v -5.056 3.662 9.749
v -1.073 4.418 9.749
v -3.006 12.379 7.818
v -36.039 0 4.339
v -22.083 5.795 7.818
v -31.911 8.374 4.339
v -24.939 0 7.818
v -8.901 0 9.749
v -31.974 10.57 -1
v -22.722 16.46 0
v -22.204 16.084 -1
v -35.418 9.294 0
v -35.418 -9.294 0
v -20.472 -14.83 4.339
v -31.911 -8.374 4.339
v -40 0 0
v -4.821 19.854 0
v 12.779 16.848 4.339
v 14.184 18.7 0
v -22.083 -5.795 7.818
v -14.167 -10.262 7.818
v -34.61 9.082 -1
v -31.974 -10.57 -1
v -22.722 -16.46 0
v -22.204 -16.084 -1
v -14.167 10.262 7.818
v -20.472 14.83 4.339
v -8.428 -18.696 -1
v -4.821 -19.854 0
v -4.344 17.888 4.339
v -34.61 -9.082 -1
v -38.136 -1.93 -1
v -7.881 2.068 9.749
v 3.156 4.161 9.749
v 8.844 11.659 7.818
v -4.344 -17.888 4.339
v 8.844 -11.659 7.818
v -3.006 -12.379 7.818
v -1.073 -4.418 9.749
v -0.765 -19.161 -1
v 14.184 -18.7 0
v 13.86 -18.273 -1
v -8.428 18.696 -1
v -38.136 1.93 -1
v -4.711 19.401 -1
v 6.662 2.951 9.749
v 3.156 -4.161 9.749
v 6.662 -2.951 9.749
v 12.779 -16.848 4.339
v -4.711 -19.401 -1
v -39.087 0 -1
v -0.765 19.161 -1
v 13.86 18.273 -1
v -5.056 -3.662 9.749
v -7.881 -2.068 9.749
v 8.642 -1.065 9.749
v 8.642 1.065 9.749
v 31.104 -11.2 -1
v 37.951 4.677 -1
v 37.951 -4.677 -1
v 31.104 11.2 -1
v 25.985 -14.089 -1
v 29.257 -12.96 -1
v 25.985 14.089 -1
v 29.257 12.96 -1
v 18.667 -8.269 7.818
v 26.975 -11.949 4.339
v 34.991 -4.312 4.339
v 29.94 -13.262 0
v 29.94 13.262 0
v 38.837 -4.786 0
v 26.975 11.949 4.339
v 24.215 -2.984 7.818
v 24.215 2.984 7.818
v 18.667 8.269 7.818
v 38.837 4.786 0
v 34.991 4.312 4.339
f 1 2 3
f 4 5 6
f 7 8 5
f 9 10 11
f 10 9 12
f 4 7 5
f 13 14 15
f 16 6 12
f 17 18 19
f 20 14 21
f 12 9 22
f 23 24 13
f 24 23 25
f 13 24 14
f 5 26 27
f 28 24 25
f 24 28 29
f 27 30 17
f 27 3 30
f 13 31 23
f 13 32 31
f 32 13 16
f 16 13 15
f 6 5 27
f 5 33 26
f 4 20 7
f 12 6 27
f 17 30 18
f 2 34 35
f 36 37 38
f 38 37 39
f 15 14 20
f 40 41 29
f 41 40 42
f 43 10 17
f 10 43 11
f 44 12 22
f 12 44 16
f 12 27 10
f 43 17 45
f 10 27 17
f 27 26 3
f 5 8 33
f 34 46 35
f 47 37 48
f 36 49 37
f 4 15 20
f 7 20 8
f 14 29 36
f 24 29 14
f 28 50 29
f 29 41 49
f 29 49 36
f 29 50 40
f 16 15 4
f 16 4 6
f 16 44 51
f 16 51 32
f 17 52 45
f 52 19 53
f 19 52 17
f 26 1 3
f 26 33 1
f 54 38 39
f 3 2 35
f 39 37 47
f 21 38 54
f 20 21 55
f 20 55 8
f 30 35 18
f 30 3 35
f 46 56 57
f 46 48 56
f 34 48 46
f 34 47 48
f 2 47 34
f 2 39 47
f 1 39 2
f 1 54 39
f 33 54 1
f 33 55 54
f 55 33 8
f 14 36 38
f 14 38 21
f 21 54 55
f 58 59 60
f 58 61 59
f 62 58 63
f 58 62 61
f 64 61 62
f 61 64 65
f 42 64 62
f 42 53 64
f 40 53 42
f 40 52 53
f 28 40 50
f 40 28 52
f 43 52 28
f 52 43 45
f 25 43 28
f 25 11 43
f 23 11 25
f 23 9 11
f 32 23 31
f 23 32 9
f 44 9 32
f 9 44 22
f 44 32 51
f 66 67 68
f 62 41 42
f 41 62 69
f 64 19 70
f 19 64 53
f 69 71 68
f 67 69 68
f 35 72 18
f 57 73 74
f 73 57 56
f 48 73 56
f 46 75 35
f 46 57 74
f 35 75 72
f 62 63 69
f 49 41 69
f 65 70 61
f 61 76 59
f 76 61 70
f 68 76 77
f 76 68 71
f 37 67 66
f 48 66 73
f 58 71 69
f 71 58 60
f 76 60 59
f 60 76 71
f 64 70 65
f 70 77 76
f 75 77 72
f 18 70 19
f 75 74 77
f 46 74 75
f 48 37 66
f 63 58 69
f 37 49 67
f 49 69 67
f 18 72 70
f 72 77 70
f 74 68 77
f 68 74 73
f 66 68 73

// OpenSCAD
// file: icp.scad
use <../lib/util.scad>;

module icp_saucer_large(extend=false) {
    difference() {
        util_saucer(80,40,10);

        if (extend == false) {
            translate([-50,0,0])
                rotate([0,15,0])
                    cube(80,center=true);
        }

        util_mirrored([0,1,0])
            translate([-40,55,-1])
                rotate([-30,0,0])
                    cube(80,center=true);
            
        translate([40,0,0])
            rotate([0,30,0])
                cube(10,center=true);

        translate([35,0,6.4])
            rotate([0,-65,0])
                cube([5,5,7.5],center=true);

    }
}

module icp_saucer_large_2(faces=32) {
    difference() {
        util_ovoid(40,40,40,10,10,faces=faces);
        
        translate([0,0,-50])
        cube(100,center=true);

        translate([-50,0,0])
            rotate([0,15,0])
                cube(80,center=true);

        util_mirrored([0,1,0])
            translate([-40,55,-1])
                rotate([-30,0,0])
                    cube(80,center=true);
            
        translate([40,0,0])
            rotate([0,30,0])
                cube(10,center=true);

        translate([35,0,6.4])
            rotate([0,-65,0])
                cube([5,5,7.5],center=true);

    }
}

module tactical_shuttle() {
    difference() {
        util_saucer(9,9,2.25);

        translate([3,0,2])
            rotate([0,-66,0])
                cube([1.5,1.5,3],center=true);
    }

    translate([-3.5,0,1])
        scale([1,1,.5])
            rotate([90,0,0])
                cylinder(5,2,2,$fn=6,center=true);

    util_mirrored([0,1,0])
        translate([-4,1.5,1])
            rotate([90,0,0])
                util_nacelle(7.5,1,4,curved=true,up=false);
};


module runabout_old() {
    difference() {
        util_saucer(18,15,3);

        translate([6,0,3.3])
            rotate([0,-72,0])
                cube([3,3,5],center=true);
    }

    translate([-7.5,0,0])
        scale([1,1,.4])
            rotate([90,0,0])
                cylinder(9,4,4,$fn=6,center=true);

    translate([-7.5,0,1])
        mirror([0,0,1])
            util_nacelle_bar(15,2.5,2.5,.5);

    util_mirrored([0,1,0])
        translate([-3,6.5,-2])
            scale([1,1,.5])
                union() {
                    rotate([0,90,0])
                        cylinder(14,1.5,1.5,center=true,$fn=16);

                    util_mirrored([1,0,0])
                        translate([7,0,0])
                            sphere(1.5,$fn=16);
                }
}

module yacht() {
    difference() {
        util_saucer(27,27,3.5);

        translate([10,0,3])
            rotate([0,-75,0])
                cube([3,3,5],center=true);
    }

    translate([-13,0,0]) {

        difference(){
            mirror([0,0,1])
                util_saucer(16,8,2.5);

            translate([-4,0,-2.5])
                scale([1.5,1,1])
                    rotate([90,0,0])
                        cylinder(10,2.5,2.5,center=true,$fn=16);
            
            translate([-9,0,-5])
                cube(10,center=true);
            
            translate([7.5,0,-1.25])
                rotate([0,90,0])
                    cylinder(4,.5,1,$fn=16, center=true);
        }

        util_saucer(16,8,1.5);
    }

    translate([-11,0,0])
        difference() {
            util_nacelle_bar(25,2.5,27,.25);
            
            translate([-29.5,0,0])
                cylinder(40,20,20,center=true);

            util_mirrored([0,1,0])
                translate([11,25,0])
                    cylinder(40,25,25,center=true);
        }

    util_mirrored([0,1,0])
        translate([-14,11,2.5])
            util_nacelle(20,4,2,curved=true);
}


module science_runabout() {
    difference() {
        util_saucer(36,36,4);

        translate([15,0,3])
            rotate([0,-75,0])
                cube([3,3,5],center=true);
    }

    translate([-13,0,0]) difference() {
        scale([1.5,1,1.2])
            rotate([90,0,0])
                cylinder(15,4,4,$fn=6,center=true);
        
        translate([0,0,-10]) cube(20,center=true);
    }
    
    translate([-15,0,1])
        util_nacelle_bar(28,2.5,3,.5);
    
    util_mirrored([0,1,0])
        translate([-8,12,3])
            util_nacelle(24,4,2,curved=true);
}


module attack() {
    difference() {
        util_saucer(45,45,5);

        translate([20,0,3])
            rotate([0,-70,0])
                cube([3,3,5],center=true);
        
    }

    difference() {
        scale([1,1,2.5])
            util_body(45,45,1.5,6);
    
        translate([22.5,0,-1.2])
            sphere(1,$fn=16);
    }

    util_mirrored([0,1,0])
        translate([-12,12,-2.5])
            rotate([75,0,0])
                util_nacelle(40,5,12,curved=true,up=false);

    difference() {
        translate([-10,0,0])
            mirror([0,0,1])
                util_nacelle_bar(35,3.2,20,2);

        util_mirrored([0,1,0])
            translate([2,18,0])
                cylinder(15,15,15,center=true);
        
        translate([-38,0,0]) cylinder(15,22.5,22.5,center=true);
    }
}

module scout_old() {
    difference() {
        util_saucer(54,54,5);

        translate([24,0,3])
            rotate([0,-70,0])
                cube([3,3,5],center=true);
    }

    translate([-36,0,0]) 
    scale([1.33,.66,1]) {
        difference() {
            cylinder(8,8,32,center=true,$fn=4);
            translate([-35,0,0])
                cube(60,center=true);
        }

        difference() {
            cylinder(8,54,32,center=true,$fn=4);
            translate([-35,0,0])
                cube([60,200,60],center=true);
            translate([35,0,0])
                cube([60,200,60],center=true);
            translate([0,0,-60])
                cube(120,center=true);
        }
    }

    util_mirrored([0,1,0])
        translate([-24,24,1.5])
            rotate([-110,0,0])
                util_nacelle(45,4,8,curved=true);

    translate([0,0,.1])
    util_nacelle(42,32,6.7,curved=true);
}

module icp_large_saucer_common() {
    difference() {
        util_ovoid(45,45,90,5,2);
        translate([45,0,0])
        cube(16,center=true);
    }

    translate([-55,0,0]) {

        difference() {
            util_ovoid(75,25,20,8,10);
            translate([20,0,-10])
            scale([2,1,1])
            rotate([90,0,0])
            cylinder(h=45,r=10,center=true);

            translate([35+20,0,-35])
            cube(70,center=true);
        }
    }

    util_ovoid(
        9,60,18,8,1);

    util_ovoid(
        18,18,36,8,1);

}
// file: ../lib/util.scad
fn1 = 32;
fn2 = 16;

module util_half_sphere(radius, fn=fn1) {
    difference() {
        sphere(radius, $fn=fn);
        translate([0,0,-(radius+radius/19)])
            cube(2*radius+radius/10, center=true);
    }
}

function gcd(a,b) = a == b ? a : a > b ? gcd(a-b, b) : gcd(a, b-a);

module util_saucer(length, width, height, fn=fn1) {
    rad = gcd(length,gcd(width,height));
    //rad = 10;
    scale([length/(2*rad), width/(2*rad), height/rad])
        util_half_sphere(rad, fn);
}

module util_half_cylinder(length, radius, inner_fn=fn2, outer_fn=fn1) {
    maxval = max(length, 2*radius);
    intersection() {
        difference() {
            rotate([0,90,0])
                translate([0,0,-(length/2 + length/20)])
                    cylinder(length+length/10, radius, radius, $fn=inner_fn);
            
            translate([0,0,(maxval/2 + maxval/19)])
                cube(maxval+maxval/10, center=true);
        }
        
        translate([0,0,-(radius+radius/20)])
            cylinder(radius + radius/10, length/2, length/2, $fn=outer_fn);
    }
}

module util_body(length, width, height, upper_height, fn=fn1) {
    rad = gcd(length, gcd(width, upper_height));
    
    scale(.995) scale([length/(2*rad), width/(2*rad), 1])
        util_half_cylinder(2*rad, height, outer_fn=fn);
}

module util_graded_cylinder(height, radius_start, radius_end, grades=1, fn=fn1) {
    height_grade = height / grades;
    radius_grade = (radius_start - radius_end) / (grades * grades);
    for (i = [0 : 1 : grades]) {
        translate([0,0,i*height_grade])
            cylinder(height_grade, 
                     radius_start - i*radius_grade * i,
                     radius_start - (i+1) * radius_grade * (i+1),
                     $fn = fn);
    }
}

module util_nacelle(length, width, height, curved=false, up=true, front_bulge=false) {
    rad = min(width, height/2);
    grads = curved ? 6 : 1;
    scale_factor = front_bulge ? 1.1 : 1;
    direction = up ? -1 : 1;
    difference() {
        scale([1, width/ (2*rad), height/rad])
            difference() {
                union() {
                    rotate([0,-90,0])
                        rotate(30)
                            util_graded_cylinder(length-rad, rad, rad/2, grads, 6);
                    scale(scale_factor) 
                        rotate([0,90,0]) rotate(90) sphere(rad, $fn=6);
                }
                
                translate([-length/2, 0, direction * (height/2 + height/19)])
                    cube([length+length, width+width, height+height/10], center=true);
            }
        
        translate([-length-(curved?length/3:0), 0, -length/3])
            rotate([0,-45,0])
                cube(length, center=true);
    }
}

module util_mirrored(v) {
    children();
    mirror(v) children();
}

module util_ring(outer, inner, height) {
    difference() {
        translate([0,0,-height/2])
            cylinder(height, outer, outer);
        translate([0,0,-(height/2 + height/19)])
            cylinder(height+height/10, inner, inner);
    }
}

module util_star(radius, thick, num, half=false) {
    angle = 360/num;
    offset = half? angle/2 : 0;
    for (i = [0: 1: num]) {
        rotate(i* angle + offset)
            translate([radius/2,0,0])
                cube([radius, thick, thick], center=true);
    }
}

module util_ring_star(radius, thick, num, inner, half=false) {
    outer=inner+thick;
    avg = (inner + outer)/2;
    union() {
        difference() {
            util_star(radius, thick, num, half);
            cylinder(2*thick, outer, outer, $fn=num, center=true);
        }
        util_ring(outer, inner, thick);
    }
}

module util_hangar_disk(height, lower, upper, num, fn=fn1) {
    difference() {
            cylinder(height, lower, upper, $fn=fn, center=true);
        difference() {
            scale([1,1,22])
                util_star(1.1*upper, height/20, num, half=true);
            scale(.95)
                cylinder(height, lower, upper, $fn=fn, center=true);
        }
    }
}

module util_hangar_form(length, width, height, num, inner=0) {
    l = 0.6* max(length, width);
    h = 2.5* height;
    thick = min(height/20,1);
    inner = inner == 0 ? l/3 : inner;
    difference() {
        children();
        scale([1,1,h/thick]) 
            util_ring_star(l, thick, num, inner, half=true);
    }
    scale(.95) children();
}

module util_nacelle_bar(span, height, width, thickness) {
    rad = (span*span/(8*height) + height/2);
    outer = rad + thickness/2;
    inner = rad - thickness/2;
    difference(){
        translate([0,0,outer])
            rotate([0,90,0])
                util_ring(outer, inner, width);
    
        translate([0,0,1.1*outer+height])
            cube(2.2*outer, center=true);
    }
}

module util_q_sphere(rad, quadrant, faces) {
    x_sign = quadrant == 1 ? 1 :
             quadrant == 2 ? -1 :
             quadrant == 3 ? -1 :
             quadrant == 4 ? 1 : 0;
    z_sign = quadrant == 1 ? 1 :
             quadrant == 2 ? 1 :
             quadrant == 3 ? -1 :
             quadrant == 4 ? -1 : 0;
    
    difference() {
        sphere(rad, $fn=faces);

        translate([x_sign*(-1.1*rad - .01),0,0])
        cube(2.2*rad, center=true);

        translate([0,0,z_sign*(-1.1*rad - .01)])
        cube(2.2*rad, center=true);
    }
}

module util_ovoid(front_rad, back_rad, width, upper_rad, lower_rad, faces=32) {
    half_width = width/2;
    largest=max(front_rad, back_rad, half_width, upper_rad, lower_rad);
    smallest=min(front_rad, back_rad, half_width, upper_rad, lower_rad);
    
    union() {
        scale([front_rad/smallest, half_width/smallest, upper_rad/smallest])
        util_q_sphere(smallest, 1, faces);
        
        scale([front_rad/smallest, half_width/smallest, lower_rad/smallest])
        util_q_sphere(smallest, 4, faces);
        
        scale([back_rad/smallest, half_width/smallest, lower_rad/smallest])
        util_q_sphere(smallest, 3, faces);
        
        scale([back_rad/smallest, half_width/smallest, upper_rad/smallest])
        util_q_sphere(smallest, 2, faces);
    }
}
// main file
use <../lib/util.scad>;
use <icp.scad>;

mirror([1,0,0])
util_ovoid(40,40,40,10,.1,faces=13);
